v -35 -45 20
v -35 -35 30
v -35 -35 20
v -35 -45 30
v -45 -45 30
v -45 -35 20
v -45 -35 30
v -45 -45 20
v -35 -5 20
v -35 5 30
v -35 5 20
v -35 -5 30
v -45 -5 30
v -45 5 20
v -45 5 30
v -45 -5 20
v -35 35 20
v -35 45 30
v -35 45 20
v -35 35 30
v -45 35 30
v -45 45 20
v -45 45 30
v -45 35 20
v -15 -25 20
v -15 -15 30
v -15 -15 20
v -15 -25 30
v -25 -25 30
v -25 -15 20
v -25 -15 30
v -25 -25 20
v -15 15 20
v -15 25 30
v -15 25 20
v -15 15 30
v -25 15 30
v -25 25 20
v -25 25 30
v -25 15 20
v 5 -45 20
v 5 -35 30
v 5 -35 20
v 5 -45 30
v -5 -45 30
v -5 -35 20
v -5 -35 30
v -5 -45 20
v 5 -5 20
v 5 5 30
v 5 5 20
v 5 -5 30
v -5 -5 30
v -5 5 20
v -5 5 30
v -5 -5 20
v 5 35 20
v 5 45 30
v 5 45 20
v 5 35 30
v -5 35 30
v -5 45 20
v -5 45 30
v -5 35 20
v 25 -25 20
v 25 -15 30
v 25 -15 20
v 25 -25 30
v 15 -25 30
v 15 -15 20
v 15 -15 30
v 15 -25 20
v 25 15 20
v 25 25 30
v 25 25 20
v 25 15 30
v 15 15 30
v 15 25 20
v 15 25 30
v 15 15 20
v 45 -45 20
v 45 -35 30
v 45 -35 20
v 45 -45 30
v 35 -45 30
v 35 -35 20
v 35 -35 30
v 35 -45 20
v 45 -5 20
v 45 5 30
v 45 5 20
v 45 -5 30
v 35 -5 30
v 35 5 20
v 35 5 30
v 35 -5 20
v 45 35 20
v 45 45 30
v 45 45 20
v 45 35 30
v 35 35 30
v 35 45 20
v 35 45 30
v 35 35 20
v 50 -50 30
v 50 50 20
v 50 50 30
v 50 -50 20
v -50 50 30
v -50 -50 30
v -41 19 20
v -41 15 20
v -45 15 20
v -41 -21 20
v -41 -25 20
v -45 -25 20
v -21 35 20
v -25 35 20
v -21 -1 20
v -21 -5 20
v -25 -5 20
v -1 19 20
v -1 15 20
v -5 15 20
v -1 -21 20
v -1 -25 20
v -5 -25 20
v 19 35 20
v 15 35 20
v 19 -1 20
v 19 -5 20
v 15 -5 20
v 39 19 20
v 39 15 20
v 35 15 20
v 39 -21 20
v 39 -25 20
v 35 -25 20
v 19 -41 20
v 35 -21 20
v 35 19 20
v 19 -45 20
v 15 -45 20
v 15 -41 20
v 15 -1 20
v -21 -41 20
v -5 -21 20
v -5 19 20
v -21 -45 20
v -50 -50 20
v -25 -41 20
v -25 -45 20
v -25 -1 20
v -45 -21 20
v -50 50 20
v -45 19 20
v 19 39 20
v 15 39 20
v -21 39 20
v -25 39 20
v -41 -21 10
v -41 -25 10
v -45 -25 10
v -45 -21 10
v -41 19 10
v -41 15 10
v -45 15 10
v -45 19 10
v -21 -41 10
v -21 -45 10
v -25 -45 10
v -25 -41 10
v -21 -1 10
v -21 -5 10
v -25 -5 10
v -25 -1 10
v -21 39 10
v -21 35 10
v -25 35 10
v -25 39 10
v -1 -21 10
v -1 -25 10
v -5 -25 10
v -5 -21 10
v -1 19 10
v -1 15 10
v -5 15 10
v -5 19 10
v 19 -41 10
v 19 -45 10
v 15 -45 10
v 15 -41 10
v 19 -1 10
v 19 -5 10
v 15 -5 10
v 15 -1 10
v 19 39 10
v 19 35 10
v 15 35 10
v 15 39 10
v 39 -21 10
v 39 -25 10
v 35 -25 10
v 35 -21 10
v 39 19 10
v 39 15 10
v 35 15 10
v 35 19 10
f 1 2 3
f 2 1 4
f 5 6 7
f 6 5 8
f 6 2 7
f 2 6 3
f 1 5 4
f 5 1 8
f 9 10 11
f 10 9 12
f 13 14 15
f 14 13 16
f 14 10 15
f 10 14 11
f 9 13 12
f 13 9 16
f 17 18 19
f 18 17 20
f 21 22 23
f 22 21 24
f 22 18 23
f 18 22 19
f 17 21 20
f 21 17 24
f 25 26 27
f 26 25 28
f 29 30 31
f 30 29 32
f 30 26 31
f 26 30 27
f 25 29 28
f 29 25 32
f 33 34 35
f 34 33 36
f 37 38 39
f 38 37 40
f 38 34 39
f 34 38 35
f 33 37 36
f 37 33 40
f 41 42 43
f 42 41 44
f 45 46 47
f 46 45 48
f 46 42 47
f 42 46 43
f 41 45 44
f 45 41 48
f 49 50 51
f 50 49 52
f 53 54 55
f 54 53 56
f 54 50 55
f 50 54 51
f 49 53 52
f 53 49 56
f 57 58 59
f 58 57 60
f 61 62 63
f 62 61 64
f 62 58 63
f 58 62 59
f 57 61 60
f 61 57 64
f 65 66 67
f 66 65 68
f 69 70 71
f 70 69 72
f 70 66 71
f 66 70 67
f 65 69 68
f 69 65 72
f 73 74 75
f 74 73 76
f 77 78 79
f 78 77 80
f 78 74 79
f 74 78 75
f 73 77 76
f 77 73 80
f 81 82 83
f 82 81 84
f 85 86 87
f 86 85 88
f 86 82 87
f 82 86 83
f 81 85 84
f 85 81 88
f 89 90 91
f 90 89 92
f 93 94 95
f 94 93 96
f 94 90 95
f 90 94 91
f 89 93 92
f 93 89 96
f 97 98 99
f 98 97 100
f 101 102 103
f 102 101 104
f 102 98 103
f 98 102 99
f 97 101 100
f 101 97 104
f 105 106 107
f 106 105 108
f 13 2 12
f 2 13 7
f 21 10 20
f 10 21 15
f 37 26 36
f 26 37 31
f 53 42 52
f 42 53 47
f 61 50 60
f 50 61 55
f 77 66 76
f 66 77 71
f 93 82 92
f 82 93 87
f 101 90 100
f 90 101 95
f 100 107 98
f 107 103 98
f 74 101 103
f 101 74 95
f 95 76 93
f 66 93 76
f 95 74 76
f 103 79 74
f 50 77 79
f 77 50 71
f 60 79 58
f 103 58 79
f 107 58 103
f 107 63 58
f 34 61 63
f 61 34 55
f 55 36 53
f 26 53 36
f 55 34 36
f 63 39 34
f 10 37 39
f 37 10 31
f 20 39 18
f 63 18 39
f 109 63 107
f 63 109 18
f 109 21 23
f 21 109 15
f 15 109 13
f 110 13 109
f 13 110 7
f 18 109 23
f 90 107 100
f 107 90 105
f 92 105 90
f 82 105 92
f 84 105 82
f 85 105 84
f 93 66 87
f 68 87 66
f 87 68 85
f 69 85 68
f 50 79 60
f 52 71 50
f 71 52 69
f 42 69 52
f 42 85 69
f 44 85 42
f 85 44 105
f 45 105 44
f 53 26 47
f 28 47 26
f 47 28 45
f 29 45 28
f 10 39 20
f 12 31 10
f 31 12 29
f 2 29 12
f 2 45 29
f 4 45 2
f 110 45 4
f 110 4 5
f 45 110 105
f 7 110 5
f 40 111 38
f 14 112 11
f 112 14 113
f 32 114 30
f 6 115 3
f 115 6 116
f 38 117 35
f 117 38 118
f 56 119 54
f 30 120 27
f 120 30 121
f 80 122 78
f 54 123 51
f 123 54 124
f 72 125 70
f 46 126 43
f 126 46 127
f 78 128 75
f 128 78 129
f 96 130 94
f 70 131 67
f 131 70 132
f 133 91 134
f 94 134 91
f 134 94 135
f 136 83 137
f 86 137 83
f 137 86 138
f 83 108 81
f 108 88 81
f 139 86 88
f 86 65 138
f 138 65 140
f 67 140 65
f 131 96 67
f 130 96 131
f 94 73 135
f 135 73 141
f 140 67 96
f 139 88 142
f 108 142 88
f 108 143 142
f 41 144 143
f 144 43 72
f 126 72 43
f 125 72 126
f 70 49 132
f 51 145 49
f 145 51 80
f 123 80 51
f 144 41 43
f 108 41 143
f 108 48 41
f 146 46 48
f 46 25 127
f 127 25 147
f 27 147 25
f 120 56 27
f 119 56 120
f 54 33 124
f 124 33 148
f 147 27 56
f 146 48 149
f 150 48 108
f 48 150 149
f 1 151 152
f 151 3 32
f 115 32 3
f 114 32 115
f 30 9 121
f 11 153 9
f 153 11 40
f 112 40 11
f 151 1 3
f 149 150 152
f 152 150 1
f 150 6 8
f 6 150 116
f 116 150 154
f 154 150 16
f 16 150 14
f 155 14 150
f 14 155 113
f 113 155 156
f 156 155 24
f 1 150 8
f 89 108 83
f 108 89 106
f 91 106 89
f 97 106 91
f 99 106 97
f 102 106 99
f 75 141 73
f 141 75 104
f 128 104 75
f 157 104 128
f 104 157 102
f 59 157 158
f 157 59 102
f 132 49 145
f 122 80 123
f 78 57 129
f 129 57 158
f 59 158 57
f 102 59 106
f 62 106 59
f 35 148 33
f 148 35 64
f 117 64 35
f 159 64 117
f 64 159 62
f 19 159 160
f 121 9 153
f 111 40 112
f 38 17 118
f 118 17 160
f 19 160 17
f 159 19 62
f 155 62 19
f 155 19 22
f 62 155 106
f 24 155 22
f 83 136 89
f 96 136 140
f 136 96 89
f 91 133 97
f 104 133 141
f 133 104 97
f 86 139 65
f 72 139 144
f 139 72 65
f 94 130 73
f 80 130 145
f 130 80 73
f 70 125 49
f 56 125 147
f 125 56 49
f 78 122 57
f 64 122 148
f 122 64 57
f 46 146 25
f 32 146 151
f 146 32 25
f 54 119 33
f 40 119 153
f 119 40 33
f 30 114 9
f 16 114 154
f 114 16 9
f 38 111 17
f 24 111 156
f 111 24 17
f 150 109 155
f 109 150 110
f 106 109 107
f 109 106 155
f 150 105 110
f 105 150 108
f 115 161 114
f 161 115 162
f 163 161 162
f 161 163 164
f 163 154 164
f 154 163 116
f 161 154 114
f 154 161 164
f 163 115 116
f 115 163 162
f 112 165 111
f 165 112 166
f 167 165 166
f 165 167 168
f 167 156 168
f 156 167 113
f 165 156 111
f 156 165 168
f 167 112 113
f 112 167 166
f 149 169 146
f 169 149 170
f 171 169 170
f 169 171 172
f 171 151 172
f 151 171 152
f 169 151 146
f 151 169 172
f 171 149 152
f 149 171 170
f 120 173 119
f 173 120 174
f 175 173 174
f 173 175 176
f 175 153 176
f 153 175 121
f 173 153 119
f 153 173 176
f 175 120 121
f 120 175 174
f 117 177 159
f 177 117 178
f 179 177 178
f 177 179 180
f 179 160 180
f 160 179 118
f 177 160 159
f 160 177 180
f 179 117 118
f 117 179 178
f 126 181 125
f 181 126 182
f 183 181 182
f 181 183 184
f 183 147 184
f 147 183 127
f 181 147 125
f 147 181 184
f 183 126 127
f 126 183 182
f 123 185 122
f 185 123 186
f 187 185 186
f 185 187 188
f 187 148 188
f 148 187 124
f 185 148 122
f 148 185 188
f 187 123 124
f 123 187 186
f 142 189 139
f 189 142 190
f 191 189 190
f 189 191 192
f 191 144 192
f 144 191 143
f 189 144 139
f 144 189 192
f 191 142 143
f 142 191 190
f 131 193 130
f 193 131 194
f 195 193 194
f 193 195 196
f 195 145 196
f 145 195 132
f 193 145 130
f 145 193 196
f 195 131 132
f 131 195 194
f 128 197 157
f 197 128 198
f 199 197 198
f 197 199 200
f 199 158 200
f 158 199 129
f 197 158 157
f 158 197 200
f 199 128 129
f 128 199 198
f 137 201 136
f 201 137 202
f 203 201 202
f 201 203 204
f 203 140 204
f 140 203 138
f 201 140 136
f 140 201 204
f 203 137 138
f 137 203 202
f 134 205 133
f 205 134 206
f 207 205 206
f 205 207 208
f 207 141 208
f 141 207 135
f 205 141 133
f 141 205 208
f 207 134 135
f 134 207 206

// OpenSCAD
top_side_length = 100;
top_thickness = 10;

stilts_height = 20;
stilts_side_length = 4;

translate([-50, -50, 0])
union() {
  // generate the top that the stilts will sit on
  difference() {
    translate([0, 0, stilts_height])
    cube([top_side_length, top_side_length, top_thickness], false);
    for(i = [0:4]) {
      for(j = [0:4]) {
        if ((i + j) % 2 == 0) {
          translate([(i*20+ 5), (j*20 + 5), 0])
          cube([10, 10, stilts_height + 20], false);
        }
      }
    }
  }

  for(i = [0:4]) {
    for(j = [0:4]) {
      if ((i + j) % 2 != 0) {
        translate([(i*20+ 5), (j*20 + 5), stilts_height/2])
        cube([stilts_side_length, stilts_side_length, stilts_height/2], false);
      }
    }
  }
}
